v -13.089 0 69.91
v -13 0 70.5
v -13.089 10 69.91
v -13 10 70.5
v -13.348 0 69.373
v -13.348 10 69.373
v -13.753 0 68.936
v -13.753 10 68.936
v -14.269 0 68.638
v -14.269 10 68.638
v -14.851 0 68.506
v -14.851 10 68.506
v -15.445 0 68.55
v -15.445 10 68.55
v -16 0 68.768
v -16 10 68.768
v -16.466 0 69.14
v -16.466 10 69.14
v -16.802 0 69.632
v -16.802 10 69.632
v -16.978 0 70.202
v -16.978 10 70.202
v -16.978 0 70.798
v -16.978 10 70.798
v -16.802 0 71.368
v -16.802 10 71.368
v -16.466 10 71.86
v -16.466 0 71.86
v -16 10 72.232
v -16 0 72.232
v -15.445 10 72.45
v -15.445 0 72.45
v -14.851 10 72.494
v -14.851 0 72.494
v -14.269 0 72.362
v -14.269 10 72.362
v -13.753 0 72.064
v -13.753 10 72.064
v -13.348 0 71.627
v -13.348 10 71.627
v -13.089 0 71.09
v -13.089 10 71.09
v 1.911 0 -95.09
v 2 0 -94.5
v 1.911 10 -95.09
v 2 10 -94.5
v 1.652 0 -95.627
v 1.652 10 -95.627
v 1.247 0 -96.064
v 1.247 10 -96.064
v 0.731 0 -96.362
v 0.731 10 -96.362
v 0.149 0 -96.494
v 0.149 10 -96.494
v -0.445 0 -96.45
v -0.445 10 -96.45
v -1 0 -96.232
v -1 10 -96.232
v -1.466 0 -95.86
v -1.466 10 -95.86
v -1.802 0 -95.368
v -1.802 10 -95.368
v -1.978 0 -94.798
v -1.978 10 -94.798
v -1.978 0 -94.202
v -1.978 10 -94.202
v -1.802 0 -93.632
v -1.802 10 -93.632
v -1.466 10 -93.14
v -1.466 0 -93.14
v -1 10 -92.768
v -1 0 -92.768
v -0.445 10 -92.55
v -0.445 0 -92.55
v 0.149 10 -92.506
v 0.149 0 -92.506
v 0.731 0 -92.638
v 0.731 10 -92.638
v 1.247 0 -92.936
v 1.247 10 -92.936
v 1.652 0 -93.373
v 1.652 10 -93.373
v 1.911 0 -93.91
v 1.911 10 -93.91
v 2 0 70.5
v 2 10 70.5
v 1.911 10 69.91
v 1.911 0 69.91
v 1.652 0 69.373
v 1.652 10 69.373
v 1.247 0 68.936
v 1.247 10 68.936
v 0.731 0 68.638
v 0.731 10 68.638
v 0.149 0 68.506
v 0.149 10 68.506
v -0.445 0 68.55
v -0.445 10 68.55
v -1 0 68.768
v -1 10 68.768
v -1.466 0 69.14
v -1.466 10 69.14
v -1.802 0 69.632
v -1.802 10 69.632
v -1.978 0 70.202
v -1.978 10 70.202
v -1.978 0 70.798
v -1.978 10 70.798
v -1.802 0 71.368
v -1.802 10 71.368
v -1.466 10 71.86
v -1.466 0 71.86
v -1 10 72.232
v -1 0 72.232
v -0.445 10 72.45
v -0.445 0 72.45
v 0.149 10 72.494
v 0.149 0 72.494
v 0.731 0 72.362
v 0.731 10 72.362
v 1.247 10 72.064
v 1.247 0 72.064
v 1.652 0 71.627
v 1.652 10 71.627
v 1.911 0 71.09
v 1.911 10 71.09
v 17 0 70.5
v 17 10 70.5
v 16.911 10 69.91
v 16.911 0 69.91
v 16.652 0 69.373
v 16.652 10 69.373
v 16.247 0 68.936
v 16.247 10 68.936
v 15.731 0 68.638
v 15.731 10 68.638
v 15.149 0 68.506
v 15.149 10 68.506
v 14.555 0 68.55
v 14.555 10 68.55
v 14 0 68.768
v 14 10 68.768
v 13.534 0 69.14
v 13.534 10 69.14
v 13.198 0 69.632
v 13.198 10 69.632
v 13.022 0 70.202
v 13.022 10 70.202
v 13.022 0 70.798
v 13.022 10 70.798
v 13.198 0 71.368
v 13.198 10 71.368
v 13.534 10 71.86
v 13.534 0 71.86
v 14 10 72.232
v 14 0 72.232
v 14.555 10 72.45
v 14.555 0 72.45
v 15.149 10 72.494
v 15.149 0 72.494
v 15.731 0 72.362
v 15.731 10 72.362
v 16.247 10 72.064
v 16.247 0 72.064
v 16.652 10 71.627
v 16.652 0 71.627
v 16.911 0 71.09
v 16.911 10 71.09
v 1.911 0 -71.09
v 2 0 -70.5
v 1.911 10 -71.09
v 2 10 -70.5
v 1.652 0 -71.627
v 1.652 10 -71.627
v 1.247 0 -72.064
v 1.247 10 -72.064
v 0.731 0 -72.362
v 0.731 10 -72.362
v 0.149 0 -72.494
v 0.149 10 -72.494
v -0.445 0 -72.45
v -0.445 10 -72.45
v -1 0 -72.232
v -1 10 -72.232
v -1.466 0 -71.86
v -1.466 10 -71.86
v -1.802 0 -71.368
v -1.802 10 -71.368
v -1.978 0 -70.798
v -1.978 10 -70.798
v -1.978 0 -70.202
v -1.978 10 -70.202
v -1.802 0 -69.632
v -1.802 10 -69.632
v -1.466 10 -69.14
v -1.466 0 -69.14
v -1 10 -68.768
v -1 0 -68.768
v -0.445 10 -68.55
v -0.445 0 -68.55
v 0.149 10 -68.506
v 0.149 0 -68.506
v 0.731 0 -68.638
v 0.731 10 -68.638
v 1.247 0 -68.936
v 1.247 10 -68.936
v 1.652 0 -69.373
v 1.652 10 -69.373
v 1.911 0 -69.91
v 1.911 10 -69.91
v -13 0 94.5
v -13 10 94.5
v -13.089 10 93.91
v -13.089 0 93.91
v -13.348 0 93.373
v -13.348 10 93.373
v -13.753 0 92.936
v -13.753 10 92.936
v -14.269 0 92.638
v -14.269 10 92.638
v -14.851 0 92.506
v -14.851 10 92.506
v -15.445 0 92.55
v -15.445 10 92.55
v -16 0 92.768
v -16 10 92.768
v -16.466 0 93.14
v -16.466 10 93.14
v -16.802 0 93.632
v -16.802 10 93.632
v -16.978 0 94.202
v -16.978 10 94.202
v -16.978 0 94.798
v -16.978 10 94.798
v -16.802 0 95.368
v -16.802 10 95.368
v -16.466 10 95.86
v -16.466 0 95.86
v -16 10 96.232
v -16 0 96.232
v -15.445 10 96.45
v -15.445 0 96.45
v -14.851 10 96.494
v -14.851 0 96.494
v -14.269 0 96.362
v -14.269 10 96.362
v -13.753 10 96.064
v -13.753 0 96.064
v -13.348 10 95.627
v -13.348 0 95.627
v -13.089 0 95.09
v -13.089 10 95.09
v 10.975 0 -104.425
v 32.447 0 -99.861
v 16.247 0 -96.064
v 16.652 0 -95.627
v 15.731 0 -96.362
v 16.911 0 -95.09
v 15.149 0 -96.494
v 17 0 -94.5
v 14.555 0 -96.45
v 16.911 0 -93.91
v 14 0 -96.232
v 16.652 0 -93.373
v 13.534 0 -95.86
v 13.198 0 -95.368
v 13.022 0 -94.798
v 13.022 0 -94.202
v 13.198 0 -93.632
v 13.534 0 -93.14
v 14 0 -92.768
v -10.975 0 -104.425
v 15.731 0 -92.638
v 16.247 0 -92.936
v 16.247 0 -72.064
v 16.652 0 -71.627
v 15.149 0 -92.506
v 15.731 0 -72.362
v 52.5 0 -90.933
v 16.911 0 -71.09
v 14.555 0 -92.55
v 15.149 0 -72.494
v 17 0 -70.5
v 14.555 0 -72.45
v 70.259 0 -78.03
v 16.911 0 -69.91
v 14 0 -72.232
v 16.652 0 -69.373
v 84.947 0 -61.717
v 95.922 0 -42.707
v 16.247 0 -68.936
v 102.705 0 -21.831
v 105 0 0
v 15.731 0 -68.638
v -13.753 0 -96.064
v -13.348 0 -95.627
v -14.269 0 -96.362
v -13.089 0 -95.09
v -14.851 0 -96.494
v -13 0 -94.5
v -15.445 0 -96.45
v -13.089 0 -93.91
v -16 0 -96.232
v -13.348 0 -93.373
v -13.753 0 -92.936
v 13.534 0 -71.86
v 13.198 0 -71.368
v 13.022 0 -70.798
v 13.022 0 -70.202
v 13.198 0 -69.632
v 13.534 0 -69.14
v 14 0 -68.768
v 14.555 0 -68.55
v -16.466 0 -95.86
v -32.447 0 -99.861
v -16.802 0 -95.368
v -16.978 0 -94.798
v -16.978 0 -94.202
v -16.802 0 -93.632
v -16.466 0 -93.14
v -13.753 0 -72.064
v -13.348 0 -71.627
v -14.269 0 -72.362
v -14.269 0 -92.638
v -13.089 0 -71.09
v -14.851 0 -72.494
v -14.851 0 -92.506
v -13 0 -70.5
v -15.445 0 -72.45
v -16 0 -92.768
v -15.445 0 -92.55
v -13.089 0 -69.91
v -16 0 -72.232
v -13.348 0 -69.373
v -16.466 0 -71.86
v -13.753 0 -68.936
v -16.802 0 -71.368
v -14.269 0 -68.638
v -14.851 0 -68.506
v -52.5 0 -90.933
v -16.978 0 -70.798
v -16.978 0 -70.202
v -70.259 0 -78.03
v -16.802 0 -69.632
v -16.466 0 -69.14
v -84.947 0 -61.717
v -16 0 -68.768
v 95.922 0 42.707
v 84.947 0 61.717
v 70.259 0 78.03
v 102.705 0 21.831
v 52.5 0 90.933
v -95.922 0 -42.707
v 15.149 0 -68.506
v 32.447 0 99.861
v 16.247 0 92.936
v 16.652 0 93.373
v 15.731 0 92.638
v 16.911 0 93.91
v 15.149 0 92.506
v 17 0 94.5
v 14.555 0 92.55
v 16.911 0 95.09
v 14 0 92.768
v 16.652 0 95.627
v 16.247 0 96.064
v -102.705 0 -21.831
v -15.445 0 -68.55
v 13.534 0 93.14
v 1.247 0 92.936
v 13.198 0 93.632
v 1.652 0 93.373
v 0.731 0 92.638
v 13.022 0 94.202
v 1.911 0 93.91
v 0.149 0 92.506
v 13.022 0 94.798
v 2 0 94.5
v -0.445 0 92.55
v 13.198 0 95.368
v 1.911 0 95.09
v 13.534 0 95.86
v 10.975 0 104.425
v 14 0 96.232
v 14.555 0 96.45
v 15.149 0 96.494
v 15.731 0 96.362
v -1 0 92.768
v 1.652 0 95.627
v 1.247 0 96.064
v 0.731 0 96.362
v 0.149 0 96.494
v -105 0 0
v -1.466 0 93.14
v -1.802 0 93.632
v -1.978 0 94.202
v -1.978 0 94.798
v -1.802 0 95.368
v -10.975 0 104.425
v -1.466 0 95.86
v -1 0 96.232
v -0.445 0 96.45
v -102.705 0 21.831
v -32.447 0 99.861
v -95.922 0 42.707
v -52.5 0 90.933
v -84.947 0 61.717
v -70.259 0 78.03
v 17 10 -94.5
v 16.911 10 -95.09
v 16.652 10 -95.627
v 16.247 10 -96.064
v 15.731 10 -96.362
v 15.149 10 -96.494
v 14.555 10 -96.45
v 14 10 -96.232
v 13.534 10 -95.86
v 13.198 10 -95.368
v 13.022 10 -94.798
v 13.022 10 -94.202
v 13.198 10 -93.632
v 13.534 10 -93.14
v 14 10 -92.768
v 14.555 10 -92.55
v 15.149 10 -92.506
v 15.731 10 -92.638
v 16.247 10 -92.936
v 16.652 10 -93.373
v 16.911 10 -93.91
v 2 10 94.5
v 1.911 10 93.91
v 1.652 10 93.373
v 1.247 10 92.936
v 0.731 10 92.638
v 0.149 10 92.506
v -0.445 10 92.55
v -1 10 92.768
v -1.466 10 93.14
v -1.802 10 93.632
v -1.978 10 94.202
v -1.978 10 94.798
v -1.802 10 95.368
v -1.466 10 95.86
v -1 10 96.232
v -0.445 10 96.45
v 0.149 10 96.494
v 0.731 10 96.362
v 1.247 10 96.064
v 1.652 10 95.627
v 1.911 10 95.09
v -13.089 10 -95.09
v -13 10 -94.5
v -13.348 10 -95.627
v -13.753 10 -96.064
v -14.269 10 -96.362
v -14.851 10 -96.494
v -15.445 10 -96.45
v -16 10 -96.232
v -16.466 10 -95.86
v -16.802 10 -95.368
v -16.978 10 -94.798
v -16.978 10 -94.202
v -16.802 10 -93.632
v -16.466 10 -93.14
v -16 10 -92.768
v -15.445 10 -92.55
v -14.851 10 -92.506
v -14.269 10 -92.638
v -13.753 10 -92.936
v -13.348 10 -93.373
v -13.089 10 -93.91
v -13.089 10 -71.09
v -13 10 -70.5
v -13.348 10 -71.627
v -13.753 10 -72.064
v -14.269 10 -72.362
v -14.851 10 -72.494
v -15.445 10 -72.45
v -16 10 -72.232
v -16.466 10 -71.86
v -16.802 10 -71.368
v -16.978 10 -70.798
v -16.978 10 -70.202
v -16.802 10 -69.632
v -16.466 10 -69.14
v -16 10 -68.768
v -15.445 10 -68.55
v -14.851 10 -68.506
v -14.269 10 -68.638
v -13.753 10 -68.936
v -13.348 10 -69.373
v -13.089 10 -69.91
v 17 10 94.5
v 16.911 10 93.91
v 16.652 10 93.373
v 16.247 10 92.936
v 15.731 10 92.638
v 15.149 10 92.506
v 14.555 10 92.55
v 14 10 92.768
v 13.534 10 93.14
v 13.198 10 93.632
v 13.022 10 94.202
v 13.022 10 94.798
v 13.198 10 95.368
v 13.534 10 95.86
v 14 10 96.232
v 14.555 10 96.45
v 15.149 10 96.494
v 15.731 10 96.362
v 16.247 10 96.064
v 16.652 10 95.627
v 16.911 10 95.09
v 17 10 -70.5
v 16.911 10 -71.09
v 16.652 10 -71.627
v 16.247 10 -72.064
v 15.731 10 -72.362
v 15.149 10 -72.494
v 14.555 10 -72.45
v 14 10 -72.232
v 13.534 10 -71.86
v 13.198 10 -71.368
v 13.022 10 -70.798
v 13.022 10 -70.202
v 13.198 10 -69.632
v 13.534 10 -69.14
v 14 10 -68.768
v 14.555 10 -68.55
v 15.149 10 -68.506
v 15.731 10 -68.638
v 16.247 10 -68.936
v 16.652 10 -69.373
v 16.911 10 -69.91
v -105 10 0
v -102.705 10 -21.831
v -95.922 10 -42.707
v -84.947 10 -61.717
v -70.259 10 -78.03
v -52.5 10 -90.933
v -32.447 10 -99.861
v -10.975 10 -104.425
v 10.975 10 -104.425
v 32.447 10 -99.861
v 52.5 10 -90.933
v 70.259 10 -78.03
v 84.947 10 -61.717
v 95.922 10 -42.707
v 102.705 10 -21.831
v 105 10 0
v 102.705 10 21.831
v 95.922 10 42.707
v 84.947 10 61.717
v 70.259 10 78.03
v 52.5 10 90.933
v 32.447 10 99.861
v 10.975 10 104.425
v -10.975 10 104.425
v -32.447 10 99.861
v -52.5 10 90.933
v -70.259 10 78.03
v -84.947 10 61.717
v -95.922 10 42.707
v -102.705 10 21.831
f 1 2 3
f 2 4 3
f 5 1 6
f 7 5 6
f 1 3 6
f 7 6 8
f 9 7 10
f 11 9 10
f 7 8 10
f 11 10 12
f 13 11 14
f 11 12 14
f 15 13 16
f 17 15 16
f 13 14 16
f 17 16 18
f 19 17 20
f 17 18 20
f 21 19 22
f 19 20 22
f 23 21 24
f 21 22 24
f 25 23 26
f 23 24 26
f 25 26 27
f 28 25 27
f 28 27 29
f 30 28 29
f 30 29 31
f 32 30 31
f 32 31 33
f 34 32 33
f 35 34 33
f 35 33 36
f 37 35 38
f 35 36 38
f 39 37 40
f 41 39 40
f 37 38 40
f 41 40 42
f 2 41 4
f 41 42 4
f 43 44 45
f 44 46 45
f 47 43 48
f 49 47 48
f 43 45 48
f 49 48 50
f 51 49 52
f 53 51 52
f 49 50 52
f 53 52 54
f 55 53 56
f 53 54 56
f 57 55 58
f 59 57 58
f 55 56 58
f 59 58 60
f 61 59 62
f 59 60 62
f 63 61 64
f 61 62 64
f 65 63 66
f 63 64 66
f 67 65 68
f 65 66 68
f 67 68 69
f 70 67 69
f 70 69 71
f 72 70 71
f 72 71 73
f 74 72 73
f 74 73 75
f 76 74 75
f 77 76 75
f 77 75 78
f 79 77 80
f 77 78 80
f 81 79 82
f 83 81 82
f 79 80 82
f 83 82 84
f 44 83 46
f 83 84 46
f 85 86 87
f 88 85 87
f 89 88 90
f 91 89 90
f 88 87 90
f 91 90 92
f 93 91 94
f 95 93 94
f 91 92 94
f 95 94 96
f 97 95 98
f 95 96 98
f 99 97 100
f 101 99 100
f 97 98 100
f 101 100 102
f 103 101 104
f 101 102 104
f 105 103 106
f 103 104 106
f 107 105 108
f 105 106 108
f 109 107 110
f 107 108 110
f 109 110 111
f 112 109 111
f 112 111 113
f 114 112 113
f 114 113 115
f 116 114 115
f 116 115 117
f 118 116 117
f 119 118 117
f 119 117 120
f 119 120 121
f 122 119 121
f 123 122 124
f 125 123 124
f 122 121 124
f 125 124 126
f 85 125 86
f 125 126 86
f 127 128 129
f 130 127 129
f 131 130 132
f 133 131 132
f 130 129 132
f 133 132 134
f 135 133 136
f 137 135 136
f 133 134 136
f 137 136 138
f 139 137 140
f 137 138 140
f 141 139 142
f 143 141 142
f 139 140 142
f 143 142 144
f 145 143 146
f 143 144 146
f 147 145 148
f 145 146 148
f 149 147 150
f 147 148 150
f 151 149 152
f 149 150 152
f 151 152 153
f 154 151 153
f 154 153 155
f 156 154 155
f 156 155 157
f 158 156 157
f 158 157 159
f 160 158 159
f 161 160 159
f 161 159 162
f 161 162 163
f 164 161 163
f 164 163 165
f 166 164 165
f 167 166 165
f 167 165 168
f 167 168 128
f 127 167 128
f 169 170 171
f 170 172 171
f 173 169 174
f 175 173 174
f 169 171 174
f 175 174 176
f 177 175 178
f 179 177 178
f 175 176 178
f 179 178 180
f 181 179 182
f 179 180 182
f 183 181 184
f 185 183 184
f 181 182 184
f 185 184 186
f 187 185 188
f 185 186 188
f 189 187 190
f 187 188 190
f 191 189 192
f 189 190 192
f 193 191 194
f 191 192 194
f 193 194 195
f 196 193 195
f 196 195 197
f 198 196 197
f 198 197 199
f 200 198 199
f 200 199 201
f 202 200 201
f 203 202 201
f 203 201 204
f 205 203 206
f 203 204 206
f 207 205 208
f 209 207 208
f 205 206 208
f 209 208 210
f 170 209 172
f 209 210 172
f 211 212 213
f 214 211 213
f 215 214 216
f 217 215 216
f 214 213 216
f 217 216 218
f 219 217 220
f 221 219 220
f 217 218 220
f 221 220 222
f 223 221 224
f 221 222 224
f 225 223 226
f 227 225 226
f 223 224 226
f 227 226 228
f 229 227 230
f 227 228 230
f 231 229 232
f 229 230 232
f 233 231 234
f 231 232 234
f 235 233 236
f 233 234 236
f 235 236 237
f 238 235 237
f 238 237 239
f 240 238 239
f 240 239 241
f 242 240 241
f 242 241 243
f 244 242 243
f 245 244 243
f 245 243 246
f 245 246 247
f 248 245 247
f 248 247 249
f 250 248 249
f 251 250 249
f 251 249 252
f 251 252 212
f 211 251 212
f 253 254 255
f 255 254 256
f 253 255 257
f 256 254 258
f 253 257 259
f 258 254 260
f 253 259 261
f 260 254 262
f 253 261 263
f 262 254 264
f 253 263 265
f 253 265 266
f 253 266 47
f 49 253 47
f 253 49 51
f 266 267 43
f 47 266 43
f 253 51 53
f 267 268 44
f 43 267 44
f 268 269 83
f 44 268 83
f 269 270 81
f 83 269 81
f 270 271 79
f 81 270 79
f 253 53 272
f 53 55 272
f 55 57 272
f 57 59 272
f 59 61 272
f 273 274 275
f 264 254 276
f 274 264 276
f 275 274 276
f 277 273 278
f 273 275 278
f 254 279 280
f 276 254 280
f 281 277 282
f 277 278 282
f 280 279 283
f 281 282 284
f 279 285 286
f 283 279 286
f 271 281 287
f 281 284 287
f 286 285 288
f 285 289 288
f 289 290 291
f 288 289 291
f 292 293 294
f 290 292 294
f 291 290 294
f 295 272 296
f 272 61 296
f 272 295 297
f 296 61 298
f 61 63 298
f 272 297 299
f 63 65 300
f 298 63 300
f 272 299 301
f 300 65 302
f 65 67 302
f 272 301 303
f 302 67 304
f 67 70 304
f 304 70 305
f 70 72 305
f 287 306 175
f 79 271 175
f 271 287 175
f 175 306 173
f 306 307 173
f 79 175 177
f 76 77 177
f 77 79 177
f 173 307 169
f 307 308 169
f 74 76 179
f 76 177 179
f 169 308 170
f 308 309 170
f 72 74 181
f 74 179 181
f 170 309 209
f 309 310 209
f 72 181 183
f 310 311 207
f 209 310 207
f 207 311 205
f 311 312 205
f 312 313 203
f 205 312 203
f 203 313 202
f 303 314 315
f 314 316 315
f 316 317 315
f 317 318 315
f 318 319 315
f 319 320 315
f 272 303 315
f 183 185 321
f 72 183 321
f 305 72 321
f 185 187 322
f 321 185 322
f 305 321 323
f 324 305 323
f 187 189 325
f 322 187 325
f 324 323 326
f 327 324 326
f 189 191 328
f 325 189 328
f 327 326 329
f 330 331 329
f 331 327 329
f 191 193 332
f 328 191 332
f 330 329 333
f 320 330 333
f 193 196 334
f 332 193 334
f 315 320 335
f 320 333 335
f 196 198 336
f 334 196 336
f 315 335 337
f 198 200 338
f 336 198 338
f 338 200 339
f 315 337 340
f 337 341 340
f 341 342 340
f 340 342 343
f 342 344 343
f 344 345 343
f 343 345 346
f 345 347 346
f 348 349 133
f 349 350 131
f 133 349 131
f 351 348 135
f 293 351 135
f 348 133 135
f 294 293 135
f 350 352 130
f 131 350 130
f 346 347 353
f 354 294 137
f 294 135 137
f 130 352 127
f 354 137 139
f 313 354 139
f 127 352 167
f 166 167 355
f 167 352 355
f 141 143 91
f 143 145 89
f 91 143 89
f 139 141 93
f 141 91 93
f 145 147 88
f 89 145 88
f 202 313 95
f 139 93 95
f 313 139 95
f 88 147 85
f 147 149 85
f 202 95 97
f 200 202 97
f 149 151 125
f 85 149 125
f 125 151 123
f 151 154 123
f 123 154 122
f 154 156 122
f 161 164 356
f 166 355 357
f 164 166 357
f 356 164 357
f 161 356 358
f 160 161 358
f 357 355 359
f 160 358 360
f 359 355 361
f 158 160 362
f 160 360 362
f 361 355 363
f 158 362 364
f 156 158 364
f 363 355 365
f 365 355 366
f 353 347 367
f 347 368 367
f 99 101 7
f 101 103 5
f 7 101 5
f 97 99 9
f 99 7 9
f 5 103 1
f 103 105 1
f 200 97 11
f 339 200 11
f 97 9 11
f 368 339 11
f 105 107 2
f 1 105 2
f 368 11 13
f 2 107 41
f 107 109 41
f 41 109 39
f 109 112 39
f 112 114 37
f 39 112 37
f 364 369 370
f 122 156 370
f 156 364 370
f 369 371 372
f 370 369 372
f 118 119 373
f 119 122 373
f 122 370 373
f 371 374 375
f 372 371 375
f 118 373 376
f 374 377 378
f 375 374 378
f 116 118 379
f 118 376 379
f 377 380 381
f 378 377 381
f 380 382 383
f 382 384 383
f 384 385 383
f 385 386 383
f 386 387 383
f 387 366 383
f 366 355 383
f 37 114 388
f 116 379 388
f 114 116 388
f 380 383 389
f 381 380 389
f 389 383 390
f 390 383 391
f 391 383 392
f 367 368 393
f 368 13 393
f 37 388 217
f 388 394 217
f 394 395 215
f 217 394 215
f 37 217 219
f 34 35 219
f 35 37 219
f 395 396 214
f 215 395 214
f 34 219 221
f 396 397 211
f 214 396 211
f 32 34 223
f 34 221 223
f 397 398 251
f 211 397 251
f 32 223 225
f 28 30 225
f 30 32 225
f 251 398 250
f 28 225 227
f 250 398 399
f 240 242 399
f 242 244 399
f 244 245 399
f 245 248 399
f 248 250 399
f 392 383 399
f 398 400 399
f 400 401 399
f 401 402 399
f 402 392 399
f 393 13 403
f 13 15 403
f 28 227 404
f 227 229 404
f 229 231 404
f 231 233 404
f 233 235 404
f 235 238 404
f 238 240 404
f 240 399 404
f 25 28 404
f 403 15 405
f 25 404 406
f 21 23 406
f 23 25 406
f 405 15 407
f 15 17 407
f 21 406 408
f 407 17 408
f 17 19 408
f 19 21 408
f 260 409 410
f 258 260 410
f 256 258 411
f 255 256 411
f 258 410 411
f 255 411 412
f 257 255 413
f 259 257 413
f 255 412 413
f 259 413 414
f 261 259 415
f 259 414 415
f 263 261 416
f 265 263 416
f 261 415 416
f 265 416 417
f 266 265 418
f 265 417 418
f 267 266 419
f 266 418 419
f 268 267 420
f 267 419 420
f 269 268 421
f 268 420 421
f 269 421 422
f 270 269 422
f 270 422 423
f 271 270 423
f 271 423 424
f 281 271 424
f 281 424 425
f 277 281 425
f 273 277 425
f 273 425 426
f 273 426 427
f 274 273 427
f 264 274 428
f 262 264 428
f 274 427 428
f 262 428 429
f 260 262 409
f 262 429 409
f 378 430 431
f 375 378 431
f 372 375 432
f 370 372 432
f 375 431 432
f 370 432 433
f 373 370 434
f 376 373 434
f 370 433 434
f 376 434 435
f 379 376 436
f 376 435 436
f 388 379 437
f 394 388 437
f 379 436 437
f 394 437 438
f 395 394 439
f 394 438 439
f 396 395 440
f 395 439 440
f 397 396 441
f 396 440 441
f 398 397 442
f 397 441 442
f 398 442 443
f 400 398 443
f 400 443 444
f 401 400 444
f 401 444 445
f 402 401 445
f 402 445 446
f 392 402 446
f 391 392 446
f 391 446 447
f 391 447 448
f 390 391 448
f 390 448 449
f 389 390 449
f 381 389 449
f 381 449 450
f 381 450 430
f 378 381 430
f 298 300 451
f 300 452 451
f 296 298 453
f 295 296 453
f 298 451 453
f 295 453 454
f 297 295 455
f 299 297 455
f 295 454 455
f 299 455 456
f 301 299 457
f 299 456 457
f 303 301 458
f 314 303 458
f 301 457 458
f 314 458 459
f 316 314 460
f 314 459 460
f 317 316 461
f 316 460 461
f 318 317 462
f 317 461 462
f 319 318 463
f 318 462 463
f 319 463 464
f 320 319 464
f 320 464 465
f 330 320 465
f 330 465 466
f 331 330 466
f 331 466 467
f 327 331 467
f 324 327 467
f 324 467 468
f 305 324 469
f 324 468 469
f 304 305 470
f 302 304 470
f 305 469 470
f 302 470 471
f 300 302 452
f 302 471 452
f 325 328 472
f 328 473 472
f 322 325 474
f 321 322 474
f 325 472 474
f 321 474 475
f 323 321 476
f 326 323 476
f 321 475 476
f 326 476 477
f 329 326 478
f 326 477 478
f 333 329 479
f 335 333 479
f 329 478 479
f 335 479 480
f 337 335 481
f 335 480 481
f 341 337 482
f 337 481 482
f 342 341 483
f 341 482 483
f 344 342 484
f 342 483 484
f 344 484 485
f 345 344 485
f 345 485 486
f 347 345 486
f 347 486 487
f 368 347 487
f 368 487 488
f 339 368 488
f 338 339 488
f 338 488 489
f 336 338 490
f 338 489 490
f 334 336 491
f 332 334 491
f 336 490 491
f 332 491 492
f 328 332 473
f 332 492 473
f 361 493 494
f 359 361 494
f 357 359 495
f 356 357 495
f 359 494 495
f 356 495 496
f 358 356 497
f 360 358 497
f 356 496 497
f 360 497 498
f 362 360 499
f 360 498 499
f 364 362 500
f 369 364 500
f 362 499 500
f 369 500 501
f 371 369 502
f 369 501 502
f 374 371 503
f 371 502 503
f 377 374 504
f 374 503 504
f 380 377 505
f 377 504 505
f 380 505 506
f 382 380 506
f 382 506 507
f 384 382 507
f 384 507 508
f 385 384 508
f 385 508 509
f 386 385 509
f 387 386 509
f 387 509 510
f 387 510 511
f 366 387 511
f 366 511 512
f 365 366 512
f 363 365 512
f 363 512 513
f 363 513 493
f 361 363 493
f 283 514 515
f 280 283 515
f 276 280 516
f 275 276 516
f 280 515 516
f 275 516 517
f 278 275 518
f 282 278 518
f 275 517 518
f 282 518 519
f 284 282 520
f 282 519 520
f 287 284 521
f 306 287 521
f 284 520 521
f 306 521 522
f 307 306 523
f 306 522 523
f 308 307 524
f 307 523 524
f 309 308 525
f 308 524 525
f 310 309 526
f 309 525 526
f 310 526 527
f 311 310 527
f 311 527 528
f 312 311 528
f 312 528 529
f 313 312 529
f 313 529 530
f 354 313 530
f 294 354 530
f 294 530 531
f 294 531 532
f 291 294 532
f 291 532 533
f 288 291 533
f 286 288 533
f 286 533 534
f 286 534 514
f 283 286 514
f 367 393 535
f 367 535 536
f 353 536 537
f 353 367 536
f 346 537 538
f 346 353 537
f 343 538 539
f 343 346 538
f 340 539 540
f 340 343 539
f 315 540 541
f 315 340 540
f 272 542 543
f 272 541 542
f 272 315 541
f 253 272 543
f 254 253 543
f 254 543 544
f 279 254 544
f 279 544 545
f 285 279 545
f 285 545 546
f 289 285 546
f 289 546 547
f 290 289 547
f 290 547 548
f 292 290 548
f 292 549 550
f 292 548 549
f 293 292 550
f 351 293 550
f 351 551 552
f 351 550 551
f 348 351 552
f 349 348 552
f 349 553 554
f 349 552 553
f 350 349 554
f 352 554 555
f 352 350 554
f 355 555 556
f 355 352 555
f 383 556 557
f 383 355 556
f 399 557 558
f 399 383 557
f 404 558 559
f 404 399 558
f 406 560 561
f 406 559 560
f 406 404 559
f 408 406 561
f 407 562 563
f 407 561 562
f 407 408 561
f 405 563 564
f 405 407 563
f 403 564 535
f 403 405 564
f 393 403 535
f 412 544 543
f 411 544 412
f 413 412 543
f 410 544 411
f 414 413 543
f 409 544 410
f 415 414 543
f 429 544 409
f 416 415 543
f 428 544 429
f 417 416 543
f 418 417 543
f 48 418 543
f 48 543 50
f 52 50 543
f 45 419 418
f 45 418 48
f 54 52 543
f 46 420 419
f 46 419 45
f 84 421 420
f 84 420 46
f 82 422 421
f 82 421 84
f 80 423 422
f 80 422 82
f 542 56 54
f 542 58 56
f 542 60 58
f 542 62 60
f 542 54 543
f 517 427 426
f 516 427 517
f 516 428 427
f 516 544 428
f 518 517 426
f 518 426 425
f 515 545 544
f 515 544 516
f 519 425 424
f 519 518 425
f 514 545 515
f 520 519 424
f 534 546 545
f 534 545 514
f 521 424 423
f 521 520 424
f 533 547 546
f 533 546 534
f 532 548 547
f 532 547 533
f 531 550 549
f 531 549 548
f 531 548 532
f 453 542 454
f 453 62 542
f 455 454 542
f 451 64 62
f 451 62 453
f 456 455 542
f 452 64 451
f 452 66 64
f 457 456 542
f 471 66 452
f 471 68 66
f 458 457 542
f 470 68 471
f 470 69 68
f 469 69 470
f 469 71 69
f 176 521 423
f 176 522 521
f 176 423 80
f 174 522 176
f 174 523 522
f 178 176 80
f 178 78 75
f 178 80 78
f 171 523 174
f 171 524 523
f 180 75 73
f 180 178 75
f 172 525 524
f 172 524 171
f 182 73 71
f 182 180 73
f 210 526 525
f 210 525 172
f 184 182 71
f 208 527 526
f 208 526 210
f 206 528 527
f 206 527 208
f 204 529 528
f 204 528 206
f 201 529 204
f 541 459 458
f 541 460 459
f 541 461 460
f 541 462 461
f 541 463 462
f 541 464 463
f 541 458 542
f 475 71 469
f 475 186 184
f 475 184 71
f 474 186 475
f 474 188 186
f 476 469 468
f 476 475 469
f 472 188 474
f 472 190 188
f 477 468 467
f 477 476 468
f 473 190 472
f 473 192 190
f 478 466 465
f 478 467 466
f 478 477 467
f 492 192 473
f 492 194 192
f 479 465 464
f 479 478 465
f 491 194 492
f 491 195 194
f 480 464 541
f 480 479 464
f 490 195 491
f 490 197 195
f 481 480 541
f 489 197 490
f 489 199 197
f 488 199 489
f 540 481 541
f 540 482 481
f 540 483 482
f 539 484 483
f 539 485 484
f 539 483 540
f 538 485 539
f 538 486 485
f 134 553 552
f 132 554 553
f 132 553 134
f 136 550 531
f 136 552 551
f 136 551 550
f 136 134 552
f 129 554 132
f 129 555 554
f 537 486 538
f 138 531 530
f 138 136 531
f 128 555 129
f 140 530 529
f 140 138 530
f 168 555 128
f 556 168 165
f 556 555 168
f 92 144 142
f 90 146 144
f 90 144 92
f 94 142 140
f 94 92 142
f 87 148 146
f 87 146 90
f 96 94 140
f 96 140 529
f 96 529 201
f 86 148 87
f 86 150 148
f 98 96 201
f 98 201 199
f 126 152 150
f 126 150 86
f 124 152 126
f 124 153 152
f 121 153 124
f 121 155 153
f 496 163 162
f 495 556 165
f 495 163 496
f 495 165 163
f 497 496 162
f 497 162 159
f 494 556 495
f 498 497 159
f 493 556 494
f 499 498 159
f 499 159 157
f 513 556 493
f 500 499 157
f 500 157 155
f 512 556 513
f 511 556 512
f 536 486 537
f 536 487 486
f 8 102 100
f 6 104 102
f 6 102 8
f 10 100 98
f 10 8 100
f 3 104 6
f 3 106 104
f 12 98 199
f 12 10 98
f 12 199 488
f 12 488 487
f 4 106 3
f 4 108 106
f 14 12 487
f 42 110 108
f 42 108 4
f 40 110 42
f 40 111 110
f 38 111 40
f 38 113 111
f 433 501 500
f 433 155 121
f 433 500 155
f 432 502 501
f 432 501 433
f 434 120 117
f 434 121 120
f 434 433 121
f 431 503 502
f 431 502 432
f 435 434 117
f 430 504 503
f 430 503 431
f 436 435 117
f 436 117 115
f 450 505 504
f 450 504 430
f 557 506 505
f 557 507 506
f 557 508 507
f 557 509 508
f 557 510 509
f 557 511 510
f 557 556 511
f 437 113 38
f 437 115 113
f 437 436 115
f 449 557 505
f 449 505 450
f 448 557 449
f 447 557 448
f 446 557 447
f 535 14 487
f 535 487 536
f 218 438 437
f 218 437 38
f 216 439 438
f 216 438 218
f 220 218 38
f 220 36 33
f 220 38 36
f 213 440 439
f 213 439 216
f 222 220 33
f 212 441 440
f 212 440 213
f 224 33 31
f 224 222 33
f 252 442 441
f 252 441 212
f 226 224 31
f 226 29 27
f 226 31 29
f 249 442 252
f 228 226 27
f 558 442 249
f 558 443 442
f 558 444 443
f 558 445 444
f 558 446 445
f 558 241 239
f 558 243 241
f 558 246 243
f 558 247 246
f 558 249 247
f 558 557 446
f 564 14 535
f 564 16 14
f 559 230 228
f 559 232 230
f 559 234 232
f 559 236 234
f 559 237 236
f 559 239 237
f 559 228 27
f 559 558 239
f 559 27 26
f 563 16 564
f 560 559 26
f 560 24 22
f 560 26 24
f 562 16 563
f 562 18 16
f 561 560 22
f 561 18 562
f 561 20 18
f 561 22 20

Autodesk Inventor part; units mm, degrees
ref_plane "YZ Plane" through (0, 0, 0) normal (1, 0, 0) x (0, 1, 0)
ref_plane "XZ Plane" through (0, 0, 0) normal (0, 1, 0) x (-1, 0, 0)
ref_plane "XY Plane" through (0, 0, 0) normal (0, 0, 1) x (1, 0, 0)
sketch "Sketch1" plane through (0, 0, 0) normal (0, 1, 0) x (-1, 0, 0)
  circle A0 centre (0, 0) radius 105
  dimension "d0" = 210
extrude "Extrusion1" add sketch "Sketch1" along normal blind 10
sketch "Sketch2" plane through (0, 10, 0) normal (0, 1, 0) x (1, 0, 0)
  circle A0 centre (0, 0) radius 2.5
  dimension "d3" = 5
extrude "Extrusion2" cut sketch "Sketch2" against normal blind 10
sketch "Sketch3" plane through (0, 10, 0) normal (0, 1, 0) x (1, 0, 0)
  circle A0 centre (0, 0) radius 2.5 projected
  line L0 (0, 0) -> (0, -75)
  line L1 (0, -75) -> (-15, -75)
  circle A1 centre (-30, 0) radius 2.5
  circle A2 centre (-15, 0) radius 2.5
  circle A3 centre (0, 0) radius 2.5
  line L2 (15, 70.5) -> (15, 94.5)
  line L3 (0, 0) -> (29.6742, 0)
  line L4 (15, -70.5) -> (15, -94.5)
  circle A4 centre (-15, 70.5) radius 2.5
  circle A5 centre (0, 70.5) radius 2.5
  circle A6 centre (15, 70.5) radius 2.5
  circle A7 centre (-15, 94.5) radius 2.5
  circle A8 centre (0, 94.5) radius 2.5
  circle A9 centre (15, 94.5) radius 2.5
  circle A10 centre (-15, -70.5) radius 2.5
  circle A11 centre (0, -70.5) radius 2.5
  circle A12 centre (15, -70.5) radius 2.5
  circle A13 centre (-15, -94.5) radius 2.5
  circle A14 centre (0, -94.5) radius 2.5
  circle A15 centre (15, -94.5) radius 2.5
  dimension "d9" = 75
  dimension "d10" = 15
  dimension "d19" = 5
  dimension "d20" = 5
  dimension "d21" = 5
  dimension "d25" = 5
  dimension "d26" = 5
  dimension "d27" = 5
  dimension "d28" = 5
  dimension "d29" = 5
  dimension "d30" = 5
  dimension "d31" = 5
  dimension "d32" = 5
  dimension "d33" = 5
  dimension "d34" = 5
  dimension "d35" = 5
  dimension "d36" = 5
extrude "Extrusion3" cut sketch "Sketch3" against normal blind 10 contours A11 L0 | L0 A11 | A9 | A6 | A15 | A12 | A4 | A5 | A7 | A8 | A10 | A13 | A14
sketch "Sketch4" plane through (0, 10, 0) normal (0, 1, 0) x (1, 0, 0)
  circle A0 centre (-15, 94.5) radius 2
  circle A1 centre (0, 94.5) radius 2
  circle A2 centre (15, 94.5) radius 2
  circle A3 centre (15, 70.5) radius 2
  circle A4 centre (0, 70.5) radius 2
  circle A5 centre (-15, 70.5) radius 2
  circle A6 centre (15, -70.5) radius 2
  circle A7 centre (15, -94.5) radius 2
  circle A8 centre (0, -94.5) radius 2
  circle A9 centre (-15, -94.5) radius 2
  circle A10 centre (-15, -70.5) radius 2
  circle A11 centre (0, -70.5) radius 2
  line L0 (-22.4241, -99.4431) -> (24.1315, -99.4431)
  line L1 (24.1315, -99.4431) -> (24.1315, 99.2987)
  line L2 (24.1315, 99.2987) -> (-24.4086, 99.2987)
  line L3 (-24.4086, 99.2987) -> (-22.4241, -99.4431)
  point P0 (0, 0)
  dimension "d39" = 4
  dimension "d40" = 4
  dimension "d41" = 4
  dimension "d42" = 4
  dimension "d43" = 4
  dimension "d44" = 4
  dimension "d45" = 4
  dimension "d46" = 4
  dimension "d47" = 4
  dimension "d48" = 4
  dimension "d49" = 4
  dimension "d50" = 4
extrude "Extrusion4" add sketch "Sketch4" against normal blind 10
properties part number "Base do tripé"
